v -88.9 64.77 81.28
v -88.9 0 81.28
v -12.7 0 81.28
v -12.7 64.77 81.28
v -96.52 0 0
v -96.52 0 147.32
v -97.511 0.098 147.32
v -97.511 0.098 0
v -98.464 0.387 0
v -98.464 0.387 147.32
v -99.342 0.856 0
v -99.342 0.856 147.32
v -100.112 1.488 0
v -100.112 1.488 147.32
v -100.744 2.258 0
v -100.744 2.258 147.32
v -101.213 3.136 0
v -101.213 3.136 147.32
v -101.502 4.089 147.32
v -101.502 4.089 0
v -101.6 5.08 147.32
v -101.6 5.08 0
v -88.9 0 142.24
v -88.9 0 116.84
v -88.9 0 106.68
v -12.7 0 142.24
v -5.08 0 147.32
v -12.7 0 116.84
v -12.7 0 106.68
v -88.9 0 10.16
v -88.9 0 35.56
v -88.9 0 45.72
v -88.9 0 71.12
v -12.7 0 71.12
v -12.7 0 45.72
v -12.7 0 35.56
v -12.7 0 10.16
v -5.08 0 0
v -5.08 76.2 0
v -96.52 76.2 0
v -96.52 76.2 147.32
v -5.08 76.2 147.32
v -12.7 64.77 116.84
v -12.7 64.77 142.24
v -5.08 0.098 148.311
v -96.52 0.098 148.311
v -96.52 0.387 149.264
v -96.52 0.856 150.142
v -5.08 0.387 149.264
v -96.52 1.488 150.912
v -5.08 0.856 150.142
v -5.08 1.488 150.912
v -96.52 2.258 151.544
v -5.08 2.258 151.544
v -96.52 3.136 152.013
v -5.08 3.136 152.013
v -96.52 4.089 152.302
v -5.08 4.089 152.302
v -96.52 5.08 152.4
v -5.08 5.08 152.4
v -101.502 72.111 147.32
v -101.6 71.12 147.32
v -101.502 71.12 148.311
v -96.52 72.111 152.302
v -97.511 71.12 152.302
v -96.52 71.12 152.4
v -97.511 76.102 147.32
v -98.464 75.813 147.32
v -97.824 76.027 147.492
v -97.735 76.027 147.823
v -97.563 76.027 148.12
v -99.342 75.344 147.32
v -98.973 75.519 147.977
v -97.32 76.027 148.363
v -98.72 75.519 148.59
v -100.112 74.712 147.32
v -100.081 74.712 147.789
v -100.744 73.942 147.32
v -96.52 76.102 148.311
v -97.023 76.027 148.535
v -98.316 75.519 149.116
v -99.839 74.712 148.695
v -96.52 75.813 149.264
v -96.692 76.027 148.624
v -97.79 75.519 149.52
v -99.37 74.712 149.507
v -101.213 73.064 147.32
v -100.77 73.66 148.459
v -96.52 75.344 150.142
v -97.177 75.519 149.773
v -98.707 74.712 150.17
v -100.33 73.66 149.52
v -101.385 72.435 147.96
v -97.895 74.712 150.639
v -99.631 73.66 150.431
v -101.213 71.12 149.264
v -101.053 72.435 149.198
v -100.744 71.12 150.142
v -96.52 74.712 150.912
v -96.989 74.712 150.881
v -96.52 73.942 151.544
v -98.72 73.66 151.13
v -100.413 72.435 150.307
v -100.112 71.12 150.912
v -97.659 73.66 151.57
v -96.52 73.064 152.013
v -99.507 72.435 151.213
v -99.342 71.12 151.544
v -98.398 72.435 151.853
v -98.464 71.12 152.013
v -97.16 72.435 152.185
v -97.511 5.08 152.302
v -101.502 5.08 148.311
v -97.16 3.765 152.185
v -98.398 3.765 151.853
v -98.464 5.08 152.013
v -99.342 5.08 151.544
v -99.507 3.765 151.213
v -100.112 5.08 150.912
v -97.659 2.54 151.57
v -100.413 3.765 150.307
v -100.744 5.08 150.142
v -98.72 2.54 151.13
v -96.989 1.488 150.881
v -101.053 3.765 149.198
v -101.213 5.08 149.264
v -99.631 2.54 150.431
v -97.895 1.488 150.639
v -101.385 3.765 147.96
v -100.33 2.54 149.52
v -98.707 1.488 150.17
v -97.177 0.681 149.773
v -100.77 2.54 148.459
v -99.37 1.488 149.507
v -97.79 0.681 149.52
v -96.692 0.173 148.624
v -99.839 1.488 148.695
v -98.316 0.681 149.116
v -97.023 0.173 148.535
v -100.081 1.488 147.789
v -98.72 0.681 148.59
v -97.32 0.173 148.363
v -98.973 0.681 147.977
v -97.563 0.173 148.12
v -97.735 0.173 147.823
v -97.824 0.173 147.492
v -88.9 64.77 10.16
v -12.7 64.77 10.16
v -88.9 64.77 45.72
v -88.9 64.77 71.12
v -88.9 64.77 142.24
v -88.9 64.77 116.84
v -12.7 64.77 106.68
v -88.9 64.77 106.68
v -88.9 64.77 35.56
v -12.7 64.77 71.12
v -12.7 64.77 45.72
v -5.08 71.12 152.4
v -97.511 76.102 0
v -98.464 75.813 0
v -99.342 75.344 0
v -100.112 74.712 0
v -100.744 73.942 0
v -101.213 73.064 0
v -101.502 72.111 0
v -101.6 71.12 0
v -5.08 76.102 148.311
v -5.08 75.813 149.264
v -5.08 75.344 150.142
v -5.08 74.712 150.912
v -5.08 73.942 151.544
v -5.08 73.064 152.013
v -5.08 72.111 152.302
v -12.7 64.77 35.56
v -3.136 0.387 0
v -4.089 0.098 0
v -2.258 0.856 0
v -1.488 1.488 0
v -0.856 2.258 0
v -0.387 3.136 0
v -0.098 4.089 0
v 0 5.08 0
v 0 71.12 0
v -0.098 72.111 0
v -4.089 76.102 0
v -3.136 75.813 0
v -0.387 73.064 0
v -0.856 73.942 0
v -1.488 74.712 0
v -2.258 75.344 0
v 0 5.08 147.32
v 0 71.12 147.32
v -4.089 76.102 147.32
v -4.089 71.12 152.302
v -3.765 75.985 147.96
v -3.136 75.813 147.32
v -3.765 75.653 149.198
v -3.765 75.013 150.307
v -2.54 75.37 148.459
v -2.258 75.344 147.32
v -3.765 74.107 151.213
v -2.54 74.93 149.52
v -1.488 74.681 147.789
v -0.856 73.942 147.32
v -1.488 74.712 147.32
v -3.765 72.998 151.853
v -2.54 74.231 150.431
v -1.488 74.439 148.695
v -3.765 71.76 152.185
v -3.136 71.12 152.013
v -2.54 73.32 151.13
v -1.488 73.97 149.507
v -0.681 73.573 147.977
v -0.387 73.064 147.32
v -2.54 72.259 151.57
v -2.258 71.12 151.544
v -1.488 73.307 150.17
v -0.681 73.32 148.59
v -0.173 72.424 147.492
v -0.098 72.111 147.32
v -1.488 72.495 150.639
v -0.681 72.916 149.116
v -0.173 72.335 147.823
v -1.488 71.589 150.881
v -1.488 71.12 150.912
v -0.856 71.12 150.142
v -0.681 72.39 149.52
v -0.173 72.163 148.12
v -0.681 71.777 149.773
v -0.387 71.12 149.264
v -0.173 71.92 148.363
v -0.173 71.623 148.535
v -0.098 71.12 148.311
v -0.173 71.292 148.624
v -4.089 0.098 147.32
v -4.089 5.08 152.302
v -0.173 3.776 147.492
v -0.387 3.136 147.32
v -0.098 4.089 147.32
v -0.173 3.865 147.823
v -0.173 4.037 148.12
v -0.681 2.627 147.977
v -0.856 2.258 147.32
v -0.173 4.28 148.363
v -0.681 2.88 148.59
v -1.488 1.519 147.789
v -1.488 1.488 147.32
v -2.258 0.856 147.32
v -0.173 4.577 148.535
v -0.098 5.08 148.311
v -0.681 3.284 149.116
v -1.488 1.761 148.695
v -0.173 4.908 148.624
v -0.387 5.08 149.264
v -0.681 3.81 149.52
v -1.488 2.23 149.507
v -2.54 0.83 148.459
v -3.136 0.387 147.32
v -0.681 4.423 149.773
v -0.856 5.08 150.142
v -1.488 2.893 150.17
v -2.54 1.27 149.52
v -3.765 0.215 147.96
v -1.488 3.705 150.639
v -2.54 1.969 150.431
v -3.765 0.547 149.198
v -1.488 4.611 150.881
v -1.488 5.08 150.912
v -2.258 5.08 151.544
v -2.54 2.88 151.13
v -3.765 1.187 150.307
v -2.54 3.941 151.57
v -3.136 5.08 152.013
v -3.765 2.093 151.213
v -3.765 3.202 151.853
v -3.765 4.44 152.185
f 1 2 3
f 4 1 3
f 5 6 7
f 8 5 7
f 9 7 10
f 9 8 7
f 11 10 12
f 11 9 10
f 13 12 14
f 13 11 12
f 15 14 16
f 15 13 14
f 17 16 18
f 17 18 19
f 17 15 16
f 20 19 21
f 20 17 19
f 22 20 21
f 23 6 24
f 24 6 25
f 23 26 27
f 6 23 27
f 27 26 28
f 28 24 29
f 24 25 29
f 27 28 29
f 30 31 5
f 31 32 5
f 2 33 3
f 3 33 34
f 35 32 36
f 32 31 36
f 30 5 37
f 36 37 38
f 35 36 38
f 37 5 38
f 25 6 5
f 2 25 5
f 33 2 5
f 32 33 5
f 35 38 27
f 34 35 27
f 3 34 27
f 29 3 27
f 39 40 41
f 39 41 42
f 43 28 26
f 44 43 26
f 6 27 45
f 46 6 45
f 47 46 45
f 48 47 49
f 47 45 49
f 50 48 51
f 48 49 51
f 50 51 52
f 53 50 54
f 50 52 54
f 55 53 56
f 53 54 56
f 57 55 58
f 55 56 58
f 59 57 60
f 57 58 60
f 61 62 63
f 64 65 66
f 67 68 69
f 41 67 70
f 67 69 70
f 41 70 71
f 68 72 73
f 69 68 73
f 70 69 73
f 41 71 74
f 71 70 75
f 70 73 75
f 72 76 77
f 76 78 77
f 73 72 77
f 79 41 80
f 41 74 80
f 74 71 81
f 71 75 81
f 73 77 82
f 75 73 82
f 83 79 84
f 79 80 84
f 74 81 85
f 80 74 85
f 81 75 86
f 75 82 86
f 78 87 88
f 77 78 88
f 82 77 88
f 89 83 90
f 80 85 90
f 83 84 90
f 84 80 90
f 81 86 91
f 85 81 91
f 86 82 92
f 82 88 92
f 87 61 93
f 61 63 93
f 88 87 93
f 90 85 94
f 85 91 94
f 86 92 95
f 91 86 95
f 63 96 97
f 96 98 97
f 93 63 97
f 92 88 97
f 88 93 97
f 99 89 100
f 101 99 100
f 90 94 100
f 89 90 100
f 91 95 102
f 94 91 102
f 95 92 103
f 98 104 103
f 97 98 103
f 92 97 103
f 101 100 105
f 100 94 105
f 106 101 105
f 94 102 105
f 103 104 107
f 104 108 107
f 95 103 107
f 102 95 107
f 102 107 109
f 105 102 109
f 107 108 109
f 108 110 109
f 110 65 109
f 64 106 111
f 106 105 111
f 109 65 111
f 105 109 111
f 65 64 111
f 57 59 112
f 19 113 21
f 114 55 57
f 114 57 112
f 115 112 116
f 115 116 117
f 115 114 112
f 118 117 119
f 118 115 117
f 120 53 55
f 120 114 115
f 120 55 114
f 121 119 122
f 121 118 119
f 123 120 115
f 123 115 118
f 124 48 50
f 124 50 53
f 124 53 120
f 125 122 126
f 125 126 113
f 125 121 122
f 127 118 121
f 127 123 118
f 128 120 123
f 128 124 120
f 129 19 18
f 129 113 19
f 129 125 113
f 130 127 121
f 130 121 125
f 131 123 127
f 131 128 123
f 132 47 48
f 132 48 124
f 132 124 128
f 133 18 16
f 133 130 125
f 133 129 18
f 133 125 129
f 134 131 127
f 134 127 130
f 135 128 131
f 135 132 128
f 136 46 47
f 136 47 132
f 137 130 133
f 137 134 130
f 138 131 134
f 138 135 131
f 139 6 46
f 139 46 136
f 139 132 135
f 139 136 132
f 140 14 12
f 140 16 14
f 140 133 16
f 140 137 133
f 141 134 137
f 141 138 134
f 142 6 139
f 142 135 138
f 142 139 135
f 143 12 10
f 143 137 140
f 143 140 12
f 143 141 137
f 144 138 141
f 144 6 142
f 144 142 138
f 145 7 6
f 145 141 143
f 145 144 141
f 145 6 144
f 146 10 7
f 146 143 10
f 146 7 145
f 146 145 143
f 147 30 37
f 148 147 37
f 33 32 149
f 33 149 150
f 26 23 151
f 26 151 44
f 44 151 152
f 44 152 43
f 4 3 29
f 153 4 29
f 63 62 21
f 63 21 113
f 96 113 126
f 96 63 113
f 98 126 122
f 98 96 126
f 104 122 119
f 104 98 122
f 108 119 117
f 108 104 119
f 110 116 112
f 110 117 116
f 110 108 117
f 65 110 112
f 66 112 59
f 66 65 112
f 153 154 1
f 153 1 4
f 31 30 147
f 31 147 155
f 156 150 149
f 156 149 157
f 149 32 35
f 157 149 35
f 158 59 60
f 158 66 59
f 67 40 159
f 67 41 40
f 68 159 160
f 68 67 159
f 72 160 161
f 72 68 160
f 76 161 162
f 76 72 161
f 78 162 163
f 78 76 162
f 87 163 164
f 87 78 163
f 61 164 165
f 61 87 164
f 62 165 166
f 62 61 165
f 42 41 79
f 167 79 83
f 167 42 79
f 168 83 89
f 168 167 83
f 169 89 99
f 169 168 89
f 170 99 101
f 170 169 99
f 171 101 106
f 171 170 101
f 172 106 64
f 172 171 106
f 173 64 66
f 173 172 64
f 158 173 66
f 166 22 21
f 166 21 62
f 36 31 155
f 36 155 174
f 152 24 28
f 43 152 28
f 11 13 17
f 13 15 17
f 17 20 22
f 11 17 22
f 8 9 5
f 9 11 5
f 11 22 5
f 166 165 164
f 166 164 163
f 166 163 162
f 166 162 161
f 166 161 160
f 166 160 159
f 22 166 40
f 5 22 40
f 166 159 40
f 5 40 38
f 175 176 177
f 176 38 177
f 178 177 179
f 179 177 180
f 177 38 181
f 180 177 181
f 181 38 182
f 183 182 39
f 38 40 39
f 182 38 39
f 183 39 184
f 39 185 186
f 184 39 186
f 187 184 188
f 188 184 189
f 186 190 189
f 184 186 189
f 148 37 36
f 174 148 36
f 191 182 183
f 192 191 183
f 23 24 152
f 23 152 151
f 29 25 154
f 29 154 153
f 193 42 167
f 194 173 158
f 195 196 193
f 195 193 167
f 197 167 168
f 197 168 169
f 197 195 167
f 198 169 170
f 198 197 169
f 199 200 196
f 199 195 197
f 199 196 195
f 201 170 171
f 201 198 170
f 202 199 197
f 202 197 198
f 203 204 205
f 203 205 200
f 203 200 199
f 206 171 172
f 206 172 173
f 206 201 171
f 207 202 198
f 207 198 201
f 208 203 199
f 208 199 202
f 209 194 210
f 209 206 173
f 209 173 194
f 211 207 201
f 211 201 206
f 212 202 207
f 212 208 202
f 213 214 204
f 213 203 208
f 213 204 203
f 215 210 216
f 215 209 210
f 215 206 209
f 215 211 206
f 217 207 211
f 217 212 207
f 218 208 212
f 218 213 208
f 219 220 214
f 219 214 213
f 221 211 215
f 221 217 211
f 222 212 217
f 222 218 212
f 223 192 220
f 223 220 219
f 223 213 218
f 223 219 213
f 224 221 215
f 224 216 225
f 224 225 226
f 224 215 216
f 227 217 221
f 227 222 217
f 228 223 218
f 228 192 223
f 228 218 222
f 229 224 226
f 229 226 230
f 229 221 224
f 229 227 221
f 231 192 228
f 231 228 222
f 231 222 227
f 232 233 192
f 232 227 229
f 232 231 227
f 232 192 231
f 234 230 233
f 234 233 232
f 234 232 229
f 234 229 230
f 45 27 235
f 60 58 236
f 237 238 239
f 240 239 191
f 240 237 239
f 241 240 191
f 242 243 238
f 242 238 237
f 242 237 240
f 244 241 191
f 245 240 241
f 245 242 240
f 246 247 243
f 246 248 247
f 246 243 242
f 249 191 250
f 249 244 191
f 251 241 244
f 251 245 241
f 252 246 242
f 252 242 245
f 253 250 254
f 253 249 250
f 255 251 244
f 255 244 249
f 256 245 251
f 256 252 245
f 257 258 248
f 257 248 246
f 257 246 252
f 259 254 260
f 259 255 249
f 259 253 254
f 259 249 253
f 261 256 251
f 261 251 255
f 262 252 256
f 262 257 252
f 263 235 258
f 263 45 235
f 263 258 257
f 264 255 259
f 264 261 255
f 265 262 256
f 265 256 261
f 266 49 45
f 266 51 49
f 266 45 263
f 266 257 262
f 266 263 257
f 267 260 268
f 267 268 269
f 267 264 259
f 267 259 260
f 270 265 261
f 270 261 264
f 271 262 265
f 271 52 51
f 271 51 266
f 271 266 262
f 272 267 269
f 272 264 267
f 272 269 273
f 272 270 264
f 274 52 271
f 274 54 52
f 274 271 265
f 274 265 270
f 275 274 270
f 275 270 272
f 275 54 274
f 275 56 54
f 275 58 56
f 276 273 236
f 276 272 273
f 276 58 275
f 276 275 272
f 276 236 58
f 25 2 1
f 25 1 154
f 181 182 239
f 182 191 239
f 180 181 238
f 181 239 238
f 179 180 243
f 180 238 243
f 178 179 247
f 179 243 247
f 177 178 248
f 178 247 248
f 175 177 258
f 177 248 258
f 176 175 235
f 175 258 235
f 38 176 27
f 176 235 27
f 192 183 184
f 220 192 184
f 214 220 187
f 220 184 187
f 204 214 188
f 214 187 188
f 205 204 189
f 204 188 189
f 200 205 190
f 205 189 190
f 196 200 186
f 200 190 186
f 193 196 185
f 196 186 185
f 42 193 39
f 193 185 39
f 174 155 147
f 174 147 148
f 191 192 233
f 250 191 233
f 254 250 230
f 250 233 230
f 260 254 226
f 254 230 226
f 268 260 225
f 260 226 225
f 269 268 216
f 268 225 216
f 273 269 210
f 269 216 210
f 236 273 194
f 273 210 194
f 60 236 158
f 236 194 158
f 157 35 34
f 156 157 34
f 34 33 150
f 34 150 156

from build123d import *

# Parameters (mm, degrees)
F0_W         = 101.6
F0_H         = 76.2
F1_DEPTH     = 152.4
F2_W         = 76.2
F2_H         = 25.4
F3_DEPTH     = 64.77
F4_R         = 5.08
F5_R         = 5.08
F6_T1_DEPTH  = 160.02
F6_S5_W      = 5.08
F6_S5_H      = 5.08
F6_T6_DEPTH  = 5.08
F6_S11_W     = 5.08
F6_S11_H     = 5.08
F6_T12_DEPTH = 5.08


# Not quite as in the source:
# - a fillet or chamfer that OpenCascade refuses, or shapes differently, is made with other operations: its cross-section is extruded or revolved along the edge and cut away or added


with BuildPart() as f1:
    # F0 (on Top) → F1 (new body)
    with BuildSketch(Plane.XY):
        with Locations((-50.8, 38.1)):
            Rectangle(F0_W, F0_H)
    extrude(amount=F1_DEPTH)

    # F2 (on face) → F3 (cut)
    with BuildSketch(Plane.XZ):
        with Locations((-50.8, 129.54)):
            Rectangle(F2_W, F2_H)
        with Locations((-50.8, 93.98)):
            Rectangle(F2_W, F2_H)
        with Locations((-50.8, 58.42)):
            Rectangle(F2_W, F2_H)
        with Locations((-50.8, 22.86)):
            Rectangle(F2_W, F2_H)
    extrude(amount=-F3_DEPTH, mode=Mode.SUBTRACT)

    # F4
    f4_edges = [f1.edges().sort_by_distance(p)[0] for p in [
        (-50.8, 0, 152.4),
        (-101.6, 38.1, 152.4),
    ]]
    fillet(f4_edges, radius=F4_R)

    # F5
    f5_edges = [f1.edges().sort_by_distance(p)[0] for p in [
        (0, 40.64, 152.4),
        (-48.26, 76.2, 152.4),
    ]]
    fillet(f5_edges, radius=F5_R)

    # F6: fillet of radius 5.08 on 2 edges, made by hand

    # F6_s2 → F6_t1 (cut)
    with BuildSketch(Plane.XY.offset(-12.7)):
        with BuildLine():
            ThreePointArc((0, 71.12), (-1.4878975516, 74.7121024484), (-5.08, 76.2))
            Line((-5.08, 76.2), (0, 76.2))
            Line((0, 76.2), (0, 71.12))
        make_face()
        with BuildLine():
            ThreePointArc((-96.52, 0), (-100.1121024484, 1.4878975516), (-101.6, 5.08))
            Line((-101.6, 5.08), (-101.6, 0))
            Line((-101.6, 0), (-96.52, 0))
        make_face()
    extrude(amount=F6_T1_DEPTH, mode=Mode.SUBTRACT)


with BuildPart() as f6_tool4:
    # F6_s5 → F6_t6 (new body)
    with BuildSketch(Plane.XZ.offset(-5.08)):
        with Locations((-99.06, 149.86)):
            Rectangle(F6_S5_W, F6_S5_H)
    extrude(amount=F6_T6_DEPTH)

    # F6_s7 → F6_t8 (revolve, cut)
    with BuildSketch(Plane(origin=(-96.52, 5.08, 147.32), x_dir=(0.7071067812, 0, -0.7071067812), z_dir=(-0.7071067812, 0, -0.7071067812))):
        with BuildLine():
            ThreePointArc((0, -5.08), (5.08, 0), (0, 5.08))
            Line((0, 5.08), (0, -5.08))
        make_face()
    revolve(axis=Axis((-96.52, 5.08, 147.32), (0, -1, 0)), mode=Mode.SUBTRACT)


with BuildPart() as f1_1:
    add(f1.part)

    # F6_t3: cut F6_tool4
    add(f6_tool4.part, mode=Mode.SUBTRACT)


with BuildPart() as f6_tool10:
    # F6_s11 → F6_t12 (new body)
    with BuildSketch(Plane.YZ.offset(-5.08)):
        with Locations((73.66, 149.86)):
            Rectangle(F6_S11_W, F6_S11_H)
    extrude(amount=F6_T12_DEPTH)

    # F6_s13 → F6_t14 (revolve, cut)
    with BuildSketch(Plane(origin=(-5.08, 71.12, 147.32), x_dir=(0, -0.7071067812, -0.7071067812), z_dir=(0, -0.7071067812, 0.7071067812))):
        with BuildLine():
            ThreePointArc((0, -5.08), (5.08, 0), (0, 5.08))
            Line((0, 5.08), (0, -5.08))
        make_face()
    revolve(axis=Axis((-5.08, 71.12, 147.32), (1, 0, 0)), mode=Mode.SUBTRACT)


with BuildPart() as f1_2:
    add(f1_1.part)

    # F6_t9: cut F6_tool10
    add(f6_tool10.part, mode=Mode.SUBTRACT)


solid = f1_2.part
